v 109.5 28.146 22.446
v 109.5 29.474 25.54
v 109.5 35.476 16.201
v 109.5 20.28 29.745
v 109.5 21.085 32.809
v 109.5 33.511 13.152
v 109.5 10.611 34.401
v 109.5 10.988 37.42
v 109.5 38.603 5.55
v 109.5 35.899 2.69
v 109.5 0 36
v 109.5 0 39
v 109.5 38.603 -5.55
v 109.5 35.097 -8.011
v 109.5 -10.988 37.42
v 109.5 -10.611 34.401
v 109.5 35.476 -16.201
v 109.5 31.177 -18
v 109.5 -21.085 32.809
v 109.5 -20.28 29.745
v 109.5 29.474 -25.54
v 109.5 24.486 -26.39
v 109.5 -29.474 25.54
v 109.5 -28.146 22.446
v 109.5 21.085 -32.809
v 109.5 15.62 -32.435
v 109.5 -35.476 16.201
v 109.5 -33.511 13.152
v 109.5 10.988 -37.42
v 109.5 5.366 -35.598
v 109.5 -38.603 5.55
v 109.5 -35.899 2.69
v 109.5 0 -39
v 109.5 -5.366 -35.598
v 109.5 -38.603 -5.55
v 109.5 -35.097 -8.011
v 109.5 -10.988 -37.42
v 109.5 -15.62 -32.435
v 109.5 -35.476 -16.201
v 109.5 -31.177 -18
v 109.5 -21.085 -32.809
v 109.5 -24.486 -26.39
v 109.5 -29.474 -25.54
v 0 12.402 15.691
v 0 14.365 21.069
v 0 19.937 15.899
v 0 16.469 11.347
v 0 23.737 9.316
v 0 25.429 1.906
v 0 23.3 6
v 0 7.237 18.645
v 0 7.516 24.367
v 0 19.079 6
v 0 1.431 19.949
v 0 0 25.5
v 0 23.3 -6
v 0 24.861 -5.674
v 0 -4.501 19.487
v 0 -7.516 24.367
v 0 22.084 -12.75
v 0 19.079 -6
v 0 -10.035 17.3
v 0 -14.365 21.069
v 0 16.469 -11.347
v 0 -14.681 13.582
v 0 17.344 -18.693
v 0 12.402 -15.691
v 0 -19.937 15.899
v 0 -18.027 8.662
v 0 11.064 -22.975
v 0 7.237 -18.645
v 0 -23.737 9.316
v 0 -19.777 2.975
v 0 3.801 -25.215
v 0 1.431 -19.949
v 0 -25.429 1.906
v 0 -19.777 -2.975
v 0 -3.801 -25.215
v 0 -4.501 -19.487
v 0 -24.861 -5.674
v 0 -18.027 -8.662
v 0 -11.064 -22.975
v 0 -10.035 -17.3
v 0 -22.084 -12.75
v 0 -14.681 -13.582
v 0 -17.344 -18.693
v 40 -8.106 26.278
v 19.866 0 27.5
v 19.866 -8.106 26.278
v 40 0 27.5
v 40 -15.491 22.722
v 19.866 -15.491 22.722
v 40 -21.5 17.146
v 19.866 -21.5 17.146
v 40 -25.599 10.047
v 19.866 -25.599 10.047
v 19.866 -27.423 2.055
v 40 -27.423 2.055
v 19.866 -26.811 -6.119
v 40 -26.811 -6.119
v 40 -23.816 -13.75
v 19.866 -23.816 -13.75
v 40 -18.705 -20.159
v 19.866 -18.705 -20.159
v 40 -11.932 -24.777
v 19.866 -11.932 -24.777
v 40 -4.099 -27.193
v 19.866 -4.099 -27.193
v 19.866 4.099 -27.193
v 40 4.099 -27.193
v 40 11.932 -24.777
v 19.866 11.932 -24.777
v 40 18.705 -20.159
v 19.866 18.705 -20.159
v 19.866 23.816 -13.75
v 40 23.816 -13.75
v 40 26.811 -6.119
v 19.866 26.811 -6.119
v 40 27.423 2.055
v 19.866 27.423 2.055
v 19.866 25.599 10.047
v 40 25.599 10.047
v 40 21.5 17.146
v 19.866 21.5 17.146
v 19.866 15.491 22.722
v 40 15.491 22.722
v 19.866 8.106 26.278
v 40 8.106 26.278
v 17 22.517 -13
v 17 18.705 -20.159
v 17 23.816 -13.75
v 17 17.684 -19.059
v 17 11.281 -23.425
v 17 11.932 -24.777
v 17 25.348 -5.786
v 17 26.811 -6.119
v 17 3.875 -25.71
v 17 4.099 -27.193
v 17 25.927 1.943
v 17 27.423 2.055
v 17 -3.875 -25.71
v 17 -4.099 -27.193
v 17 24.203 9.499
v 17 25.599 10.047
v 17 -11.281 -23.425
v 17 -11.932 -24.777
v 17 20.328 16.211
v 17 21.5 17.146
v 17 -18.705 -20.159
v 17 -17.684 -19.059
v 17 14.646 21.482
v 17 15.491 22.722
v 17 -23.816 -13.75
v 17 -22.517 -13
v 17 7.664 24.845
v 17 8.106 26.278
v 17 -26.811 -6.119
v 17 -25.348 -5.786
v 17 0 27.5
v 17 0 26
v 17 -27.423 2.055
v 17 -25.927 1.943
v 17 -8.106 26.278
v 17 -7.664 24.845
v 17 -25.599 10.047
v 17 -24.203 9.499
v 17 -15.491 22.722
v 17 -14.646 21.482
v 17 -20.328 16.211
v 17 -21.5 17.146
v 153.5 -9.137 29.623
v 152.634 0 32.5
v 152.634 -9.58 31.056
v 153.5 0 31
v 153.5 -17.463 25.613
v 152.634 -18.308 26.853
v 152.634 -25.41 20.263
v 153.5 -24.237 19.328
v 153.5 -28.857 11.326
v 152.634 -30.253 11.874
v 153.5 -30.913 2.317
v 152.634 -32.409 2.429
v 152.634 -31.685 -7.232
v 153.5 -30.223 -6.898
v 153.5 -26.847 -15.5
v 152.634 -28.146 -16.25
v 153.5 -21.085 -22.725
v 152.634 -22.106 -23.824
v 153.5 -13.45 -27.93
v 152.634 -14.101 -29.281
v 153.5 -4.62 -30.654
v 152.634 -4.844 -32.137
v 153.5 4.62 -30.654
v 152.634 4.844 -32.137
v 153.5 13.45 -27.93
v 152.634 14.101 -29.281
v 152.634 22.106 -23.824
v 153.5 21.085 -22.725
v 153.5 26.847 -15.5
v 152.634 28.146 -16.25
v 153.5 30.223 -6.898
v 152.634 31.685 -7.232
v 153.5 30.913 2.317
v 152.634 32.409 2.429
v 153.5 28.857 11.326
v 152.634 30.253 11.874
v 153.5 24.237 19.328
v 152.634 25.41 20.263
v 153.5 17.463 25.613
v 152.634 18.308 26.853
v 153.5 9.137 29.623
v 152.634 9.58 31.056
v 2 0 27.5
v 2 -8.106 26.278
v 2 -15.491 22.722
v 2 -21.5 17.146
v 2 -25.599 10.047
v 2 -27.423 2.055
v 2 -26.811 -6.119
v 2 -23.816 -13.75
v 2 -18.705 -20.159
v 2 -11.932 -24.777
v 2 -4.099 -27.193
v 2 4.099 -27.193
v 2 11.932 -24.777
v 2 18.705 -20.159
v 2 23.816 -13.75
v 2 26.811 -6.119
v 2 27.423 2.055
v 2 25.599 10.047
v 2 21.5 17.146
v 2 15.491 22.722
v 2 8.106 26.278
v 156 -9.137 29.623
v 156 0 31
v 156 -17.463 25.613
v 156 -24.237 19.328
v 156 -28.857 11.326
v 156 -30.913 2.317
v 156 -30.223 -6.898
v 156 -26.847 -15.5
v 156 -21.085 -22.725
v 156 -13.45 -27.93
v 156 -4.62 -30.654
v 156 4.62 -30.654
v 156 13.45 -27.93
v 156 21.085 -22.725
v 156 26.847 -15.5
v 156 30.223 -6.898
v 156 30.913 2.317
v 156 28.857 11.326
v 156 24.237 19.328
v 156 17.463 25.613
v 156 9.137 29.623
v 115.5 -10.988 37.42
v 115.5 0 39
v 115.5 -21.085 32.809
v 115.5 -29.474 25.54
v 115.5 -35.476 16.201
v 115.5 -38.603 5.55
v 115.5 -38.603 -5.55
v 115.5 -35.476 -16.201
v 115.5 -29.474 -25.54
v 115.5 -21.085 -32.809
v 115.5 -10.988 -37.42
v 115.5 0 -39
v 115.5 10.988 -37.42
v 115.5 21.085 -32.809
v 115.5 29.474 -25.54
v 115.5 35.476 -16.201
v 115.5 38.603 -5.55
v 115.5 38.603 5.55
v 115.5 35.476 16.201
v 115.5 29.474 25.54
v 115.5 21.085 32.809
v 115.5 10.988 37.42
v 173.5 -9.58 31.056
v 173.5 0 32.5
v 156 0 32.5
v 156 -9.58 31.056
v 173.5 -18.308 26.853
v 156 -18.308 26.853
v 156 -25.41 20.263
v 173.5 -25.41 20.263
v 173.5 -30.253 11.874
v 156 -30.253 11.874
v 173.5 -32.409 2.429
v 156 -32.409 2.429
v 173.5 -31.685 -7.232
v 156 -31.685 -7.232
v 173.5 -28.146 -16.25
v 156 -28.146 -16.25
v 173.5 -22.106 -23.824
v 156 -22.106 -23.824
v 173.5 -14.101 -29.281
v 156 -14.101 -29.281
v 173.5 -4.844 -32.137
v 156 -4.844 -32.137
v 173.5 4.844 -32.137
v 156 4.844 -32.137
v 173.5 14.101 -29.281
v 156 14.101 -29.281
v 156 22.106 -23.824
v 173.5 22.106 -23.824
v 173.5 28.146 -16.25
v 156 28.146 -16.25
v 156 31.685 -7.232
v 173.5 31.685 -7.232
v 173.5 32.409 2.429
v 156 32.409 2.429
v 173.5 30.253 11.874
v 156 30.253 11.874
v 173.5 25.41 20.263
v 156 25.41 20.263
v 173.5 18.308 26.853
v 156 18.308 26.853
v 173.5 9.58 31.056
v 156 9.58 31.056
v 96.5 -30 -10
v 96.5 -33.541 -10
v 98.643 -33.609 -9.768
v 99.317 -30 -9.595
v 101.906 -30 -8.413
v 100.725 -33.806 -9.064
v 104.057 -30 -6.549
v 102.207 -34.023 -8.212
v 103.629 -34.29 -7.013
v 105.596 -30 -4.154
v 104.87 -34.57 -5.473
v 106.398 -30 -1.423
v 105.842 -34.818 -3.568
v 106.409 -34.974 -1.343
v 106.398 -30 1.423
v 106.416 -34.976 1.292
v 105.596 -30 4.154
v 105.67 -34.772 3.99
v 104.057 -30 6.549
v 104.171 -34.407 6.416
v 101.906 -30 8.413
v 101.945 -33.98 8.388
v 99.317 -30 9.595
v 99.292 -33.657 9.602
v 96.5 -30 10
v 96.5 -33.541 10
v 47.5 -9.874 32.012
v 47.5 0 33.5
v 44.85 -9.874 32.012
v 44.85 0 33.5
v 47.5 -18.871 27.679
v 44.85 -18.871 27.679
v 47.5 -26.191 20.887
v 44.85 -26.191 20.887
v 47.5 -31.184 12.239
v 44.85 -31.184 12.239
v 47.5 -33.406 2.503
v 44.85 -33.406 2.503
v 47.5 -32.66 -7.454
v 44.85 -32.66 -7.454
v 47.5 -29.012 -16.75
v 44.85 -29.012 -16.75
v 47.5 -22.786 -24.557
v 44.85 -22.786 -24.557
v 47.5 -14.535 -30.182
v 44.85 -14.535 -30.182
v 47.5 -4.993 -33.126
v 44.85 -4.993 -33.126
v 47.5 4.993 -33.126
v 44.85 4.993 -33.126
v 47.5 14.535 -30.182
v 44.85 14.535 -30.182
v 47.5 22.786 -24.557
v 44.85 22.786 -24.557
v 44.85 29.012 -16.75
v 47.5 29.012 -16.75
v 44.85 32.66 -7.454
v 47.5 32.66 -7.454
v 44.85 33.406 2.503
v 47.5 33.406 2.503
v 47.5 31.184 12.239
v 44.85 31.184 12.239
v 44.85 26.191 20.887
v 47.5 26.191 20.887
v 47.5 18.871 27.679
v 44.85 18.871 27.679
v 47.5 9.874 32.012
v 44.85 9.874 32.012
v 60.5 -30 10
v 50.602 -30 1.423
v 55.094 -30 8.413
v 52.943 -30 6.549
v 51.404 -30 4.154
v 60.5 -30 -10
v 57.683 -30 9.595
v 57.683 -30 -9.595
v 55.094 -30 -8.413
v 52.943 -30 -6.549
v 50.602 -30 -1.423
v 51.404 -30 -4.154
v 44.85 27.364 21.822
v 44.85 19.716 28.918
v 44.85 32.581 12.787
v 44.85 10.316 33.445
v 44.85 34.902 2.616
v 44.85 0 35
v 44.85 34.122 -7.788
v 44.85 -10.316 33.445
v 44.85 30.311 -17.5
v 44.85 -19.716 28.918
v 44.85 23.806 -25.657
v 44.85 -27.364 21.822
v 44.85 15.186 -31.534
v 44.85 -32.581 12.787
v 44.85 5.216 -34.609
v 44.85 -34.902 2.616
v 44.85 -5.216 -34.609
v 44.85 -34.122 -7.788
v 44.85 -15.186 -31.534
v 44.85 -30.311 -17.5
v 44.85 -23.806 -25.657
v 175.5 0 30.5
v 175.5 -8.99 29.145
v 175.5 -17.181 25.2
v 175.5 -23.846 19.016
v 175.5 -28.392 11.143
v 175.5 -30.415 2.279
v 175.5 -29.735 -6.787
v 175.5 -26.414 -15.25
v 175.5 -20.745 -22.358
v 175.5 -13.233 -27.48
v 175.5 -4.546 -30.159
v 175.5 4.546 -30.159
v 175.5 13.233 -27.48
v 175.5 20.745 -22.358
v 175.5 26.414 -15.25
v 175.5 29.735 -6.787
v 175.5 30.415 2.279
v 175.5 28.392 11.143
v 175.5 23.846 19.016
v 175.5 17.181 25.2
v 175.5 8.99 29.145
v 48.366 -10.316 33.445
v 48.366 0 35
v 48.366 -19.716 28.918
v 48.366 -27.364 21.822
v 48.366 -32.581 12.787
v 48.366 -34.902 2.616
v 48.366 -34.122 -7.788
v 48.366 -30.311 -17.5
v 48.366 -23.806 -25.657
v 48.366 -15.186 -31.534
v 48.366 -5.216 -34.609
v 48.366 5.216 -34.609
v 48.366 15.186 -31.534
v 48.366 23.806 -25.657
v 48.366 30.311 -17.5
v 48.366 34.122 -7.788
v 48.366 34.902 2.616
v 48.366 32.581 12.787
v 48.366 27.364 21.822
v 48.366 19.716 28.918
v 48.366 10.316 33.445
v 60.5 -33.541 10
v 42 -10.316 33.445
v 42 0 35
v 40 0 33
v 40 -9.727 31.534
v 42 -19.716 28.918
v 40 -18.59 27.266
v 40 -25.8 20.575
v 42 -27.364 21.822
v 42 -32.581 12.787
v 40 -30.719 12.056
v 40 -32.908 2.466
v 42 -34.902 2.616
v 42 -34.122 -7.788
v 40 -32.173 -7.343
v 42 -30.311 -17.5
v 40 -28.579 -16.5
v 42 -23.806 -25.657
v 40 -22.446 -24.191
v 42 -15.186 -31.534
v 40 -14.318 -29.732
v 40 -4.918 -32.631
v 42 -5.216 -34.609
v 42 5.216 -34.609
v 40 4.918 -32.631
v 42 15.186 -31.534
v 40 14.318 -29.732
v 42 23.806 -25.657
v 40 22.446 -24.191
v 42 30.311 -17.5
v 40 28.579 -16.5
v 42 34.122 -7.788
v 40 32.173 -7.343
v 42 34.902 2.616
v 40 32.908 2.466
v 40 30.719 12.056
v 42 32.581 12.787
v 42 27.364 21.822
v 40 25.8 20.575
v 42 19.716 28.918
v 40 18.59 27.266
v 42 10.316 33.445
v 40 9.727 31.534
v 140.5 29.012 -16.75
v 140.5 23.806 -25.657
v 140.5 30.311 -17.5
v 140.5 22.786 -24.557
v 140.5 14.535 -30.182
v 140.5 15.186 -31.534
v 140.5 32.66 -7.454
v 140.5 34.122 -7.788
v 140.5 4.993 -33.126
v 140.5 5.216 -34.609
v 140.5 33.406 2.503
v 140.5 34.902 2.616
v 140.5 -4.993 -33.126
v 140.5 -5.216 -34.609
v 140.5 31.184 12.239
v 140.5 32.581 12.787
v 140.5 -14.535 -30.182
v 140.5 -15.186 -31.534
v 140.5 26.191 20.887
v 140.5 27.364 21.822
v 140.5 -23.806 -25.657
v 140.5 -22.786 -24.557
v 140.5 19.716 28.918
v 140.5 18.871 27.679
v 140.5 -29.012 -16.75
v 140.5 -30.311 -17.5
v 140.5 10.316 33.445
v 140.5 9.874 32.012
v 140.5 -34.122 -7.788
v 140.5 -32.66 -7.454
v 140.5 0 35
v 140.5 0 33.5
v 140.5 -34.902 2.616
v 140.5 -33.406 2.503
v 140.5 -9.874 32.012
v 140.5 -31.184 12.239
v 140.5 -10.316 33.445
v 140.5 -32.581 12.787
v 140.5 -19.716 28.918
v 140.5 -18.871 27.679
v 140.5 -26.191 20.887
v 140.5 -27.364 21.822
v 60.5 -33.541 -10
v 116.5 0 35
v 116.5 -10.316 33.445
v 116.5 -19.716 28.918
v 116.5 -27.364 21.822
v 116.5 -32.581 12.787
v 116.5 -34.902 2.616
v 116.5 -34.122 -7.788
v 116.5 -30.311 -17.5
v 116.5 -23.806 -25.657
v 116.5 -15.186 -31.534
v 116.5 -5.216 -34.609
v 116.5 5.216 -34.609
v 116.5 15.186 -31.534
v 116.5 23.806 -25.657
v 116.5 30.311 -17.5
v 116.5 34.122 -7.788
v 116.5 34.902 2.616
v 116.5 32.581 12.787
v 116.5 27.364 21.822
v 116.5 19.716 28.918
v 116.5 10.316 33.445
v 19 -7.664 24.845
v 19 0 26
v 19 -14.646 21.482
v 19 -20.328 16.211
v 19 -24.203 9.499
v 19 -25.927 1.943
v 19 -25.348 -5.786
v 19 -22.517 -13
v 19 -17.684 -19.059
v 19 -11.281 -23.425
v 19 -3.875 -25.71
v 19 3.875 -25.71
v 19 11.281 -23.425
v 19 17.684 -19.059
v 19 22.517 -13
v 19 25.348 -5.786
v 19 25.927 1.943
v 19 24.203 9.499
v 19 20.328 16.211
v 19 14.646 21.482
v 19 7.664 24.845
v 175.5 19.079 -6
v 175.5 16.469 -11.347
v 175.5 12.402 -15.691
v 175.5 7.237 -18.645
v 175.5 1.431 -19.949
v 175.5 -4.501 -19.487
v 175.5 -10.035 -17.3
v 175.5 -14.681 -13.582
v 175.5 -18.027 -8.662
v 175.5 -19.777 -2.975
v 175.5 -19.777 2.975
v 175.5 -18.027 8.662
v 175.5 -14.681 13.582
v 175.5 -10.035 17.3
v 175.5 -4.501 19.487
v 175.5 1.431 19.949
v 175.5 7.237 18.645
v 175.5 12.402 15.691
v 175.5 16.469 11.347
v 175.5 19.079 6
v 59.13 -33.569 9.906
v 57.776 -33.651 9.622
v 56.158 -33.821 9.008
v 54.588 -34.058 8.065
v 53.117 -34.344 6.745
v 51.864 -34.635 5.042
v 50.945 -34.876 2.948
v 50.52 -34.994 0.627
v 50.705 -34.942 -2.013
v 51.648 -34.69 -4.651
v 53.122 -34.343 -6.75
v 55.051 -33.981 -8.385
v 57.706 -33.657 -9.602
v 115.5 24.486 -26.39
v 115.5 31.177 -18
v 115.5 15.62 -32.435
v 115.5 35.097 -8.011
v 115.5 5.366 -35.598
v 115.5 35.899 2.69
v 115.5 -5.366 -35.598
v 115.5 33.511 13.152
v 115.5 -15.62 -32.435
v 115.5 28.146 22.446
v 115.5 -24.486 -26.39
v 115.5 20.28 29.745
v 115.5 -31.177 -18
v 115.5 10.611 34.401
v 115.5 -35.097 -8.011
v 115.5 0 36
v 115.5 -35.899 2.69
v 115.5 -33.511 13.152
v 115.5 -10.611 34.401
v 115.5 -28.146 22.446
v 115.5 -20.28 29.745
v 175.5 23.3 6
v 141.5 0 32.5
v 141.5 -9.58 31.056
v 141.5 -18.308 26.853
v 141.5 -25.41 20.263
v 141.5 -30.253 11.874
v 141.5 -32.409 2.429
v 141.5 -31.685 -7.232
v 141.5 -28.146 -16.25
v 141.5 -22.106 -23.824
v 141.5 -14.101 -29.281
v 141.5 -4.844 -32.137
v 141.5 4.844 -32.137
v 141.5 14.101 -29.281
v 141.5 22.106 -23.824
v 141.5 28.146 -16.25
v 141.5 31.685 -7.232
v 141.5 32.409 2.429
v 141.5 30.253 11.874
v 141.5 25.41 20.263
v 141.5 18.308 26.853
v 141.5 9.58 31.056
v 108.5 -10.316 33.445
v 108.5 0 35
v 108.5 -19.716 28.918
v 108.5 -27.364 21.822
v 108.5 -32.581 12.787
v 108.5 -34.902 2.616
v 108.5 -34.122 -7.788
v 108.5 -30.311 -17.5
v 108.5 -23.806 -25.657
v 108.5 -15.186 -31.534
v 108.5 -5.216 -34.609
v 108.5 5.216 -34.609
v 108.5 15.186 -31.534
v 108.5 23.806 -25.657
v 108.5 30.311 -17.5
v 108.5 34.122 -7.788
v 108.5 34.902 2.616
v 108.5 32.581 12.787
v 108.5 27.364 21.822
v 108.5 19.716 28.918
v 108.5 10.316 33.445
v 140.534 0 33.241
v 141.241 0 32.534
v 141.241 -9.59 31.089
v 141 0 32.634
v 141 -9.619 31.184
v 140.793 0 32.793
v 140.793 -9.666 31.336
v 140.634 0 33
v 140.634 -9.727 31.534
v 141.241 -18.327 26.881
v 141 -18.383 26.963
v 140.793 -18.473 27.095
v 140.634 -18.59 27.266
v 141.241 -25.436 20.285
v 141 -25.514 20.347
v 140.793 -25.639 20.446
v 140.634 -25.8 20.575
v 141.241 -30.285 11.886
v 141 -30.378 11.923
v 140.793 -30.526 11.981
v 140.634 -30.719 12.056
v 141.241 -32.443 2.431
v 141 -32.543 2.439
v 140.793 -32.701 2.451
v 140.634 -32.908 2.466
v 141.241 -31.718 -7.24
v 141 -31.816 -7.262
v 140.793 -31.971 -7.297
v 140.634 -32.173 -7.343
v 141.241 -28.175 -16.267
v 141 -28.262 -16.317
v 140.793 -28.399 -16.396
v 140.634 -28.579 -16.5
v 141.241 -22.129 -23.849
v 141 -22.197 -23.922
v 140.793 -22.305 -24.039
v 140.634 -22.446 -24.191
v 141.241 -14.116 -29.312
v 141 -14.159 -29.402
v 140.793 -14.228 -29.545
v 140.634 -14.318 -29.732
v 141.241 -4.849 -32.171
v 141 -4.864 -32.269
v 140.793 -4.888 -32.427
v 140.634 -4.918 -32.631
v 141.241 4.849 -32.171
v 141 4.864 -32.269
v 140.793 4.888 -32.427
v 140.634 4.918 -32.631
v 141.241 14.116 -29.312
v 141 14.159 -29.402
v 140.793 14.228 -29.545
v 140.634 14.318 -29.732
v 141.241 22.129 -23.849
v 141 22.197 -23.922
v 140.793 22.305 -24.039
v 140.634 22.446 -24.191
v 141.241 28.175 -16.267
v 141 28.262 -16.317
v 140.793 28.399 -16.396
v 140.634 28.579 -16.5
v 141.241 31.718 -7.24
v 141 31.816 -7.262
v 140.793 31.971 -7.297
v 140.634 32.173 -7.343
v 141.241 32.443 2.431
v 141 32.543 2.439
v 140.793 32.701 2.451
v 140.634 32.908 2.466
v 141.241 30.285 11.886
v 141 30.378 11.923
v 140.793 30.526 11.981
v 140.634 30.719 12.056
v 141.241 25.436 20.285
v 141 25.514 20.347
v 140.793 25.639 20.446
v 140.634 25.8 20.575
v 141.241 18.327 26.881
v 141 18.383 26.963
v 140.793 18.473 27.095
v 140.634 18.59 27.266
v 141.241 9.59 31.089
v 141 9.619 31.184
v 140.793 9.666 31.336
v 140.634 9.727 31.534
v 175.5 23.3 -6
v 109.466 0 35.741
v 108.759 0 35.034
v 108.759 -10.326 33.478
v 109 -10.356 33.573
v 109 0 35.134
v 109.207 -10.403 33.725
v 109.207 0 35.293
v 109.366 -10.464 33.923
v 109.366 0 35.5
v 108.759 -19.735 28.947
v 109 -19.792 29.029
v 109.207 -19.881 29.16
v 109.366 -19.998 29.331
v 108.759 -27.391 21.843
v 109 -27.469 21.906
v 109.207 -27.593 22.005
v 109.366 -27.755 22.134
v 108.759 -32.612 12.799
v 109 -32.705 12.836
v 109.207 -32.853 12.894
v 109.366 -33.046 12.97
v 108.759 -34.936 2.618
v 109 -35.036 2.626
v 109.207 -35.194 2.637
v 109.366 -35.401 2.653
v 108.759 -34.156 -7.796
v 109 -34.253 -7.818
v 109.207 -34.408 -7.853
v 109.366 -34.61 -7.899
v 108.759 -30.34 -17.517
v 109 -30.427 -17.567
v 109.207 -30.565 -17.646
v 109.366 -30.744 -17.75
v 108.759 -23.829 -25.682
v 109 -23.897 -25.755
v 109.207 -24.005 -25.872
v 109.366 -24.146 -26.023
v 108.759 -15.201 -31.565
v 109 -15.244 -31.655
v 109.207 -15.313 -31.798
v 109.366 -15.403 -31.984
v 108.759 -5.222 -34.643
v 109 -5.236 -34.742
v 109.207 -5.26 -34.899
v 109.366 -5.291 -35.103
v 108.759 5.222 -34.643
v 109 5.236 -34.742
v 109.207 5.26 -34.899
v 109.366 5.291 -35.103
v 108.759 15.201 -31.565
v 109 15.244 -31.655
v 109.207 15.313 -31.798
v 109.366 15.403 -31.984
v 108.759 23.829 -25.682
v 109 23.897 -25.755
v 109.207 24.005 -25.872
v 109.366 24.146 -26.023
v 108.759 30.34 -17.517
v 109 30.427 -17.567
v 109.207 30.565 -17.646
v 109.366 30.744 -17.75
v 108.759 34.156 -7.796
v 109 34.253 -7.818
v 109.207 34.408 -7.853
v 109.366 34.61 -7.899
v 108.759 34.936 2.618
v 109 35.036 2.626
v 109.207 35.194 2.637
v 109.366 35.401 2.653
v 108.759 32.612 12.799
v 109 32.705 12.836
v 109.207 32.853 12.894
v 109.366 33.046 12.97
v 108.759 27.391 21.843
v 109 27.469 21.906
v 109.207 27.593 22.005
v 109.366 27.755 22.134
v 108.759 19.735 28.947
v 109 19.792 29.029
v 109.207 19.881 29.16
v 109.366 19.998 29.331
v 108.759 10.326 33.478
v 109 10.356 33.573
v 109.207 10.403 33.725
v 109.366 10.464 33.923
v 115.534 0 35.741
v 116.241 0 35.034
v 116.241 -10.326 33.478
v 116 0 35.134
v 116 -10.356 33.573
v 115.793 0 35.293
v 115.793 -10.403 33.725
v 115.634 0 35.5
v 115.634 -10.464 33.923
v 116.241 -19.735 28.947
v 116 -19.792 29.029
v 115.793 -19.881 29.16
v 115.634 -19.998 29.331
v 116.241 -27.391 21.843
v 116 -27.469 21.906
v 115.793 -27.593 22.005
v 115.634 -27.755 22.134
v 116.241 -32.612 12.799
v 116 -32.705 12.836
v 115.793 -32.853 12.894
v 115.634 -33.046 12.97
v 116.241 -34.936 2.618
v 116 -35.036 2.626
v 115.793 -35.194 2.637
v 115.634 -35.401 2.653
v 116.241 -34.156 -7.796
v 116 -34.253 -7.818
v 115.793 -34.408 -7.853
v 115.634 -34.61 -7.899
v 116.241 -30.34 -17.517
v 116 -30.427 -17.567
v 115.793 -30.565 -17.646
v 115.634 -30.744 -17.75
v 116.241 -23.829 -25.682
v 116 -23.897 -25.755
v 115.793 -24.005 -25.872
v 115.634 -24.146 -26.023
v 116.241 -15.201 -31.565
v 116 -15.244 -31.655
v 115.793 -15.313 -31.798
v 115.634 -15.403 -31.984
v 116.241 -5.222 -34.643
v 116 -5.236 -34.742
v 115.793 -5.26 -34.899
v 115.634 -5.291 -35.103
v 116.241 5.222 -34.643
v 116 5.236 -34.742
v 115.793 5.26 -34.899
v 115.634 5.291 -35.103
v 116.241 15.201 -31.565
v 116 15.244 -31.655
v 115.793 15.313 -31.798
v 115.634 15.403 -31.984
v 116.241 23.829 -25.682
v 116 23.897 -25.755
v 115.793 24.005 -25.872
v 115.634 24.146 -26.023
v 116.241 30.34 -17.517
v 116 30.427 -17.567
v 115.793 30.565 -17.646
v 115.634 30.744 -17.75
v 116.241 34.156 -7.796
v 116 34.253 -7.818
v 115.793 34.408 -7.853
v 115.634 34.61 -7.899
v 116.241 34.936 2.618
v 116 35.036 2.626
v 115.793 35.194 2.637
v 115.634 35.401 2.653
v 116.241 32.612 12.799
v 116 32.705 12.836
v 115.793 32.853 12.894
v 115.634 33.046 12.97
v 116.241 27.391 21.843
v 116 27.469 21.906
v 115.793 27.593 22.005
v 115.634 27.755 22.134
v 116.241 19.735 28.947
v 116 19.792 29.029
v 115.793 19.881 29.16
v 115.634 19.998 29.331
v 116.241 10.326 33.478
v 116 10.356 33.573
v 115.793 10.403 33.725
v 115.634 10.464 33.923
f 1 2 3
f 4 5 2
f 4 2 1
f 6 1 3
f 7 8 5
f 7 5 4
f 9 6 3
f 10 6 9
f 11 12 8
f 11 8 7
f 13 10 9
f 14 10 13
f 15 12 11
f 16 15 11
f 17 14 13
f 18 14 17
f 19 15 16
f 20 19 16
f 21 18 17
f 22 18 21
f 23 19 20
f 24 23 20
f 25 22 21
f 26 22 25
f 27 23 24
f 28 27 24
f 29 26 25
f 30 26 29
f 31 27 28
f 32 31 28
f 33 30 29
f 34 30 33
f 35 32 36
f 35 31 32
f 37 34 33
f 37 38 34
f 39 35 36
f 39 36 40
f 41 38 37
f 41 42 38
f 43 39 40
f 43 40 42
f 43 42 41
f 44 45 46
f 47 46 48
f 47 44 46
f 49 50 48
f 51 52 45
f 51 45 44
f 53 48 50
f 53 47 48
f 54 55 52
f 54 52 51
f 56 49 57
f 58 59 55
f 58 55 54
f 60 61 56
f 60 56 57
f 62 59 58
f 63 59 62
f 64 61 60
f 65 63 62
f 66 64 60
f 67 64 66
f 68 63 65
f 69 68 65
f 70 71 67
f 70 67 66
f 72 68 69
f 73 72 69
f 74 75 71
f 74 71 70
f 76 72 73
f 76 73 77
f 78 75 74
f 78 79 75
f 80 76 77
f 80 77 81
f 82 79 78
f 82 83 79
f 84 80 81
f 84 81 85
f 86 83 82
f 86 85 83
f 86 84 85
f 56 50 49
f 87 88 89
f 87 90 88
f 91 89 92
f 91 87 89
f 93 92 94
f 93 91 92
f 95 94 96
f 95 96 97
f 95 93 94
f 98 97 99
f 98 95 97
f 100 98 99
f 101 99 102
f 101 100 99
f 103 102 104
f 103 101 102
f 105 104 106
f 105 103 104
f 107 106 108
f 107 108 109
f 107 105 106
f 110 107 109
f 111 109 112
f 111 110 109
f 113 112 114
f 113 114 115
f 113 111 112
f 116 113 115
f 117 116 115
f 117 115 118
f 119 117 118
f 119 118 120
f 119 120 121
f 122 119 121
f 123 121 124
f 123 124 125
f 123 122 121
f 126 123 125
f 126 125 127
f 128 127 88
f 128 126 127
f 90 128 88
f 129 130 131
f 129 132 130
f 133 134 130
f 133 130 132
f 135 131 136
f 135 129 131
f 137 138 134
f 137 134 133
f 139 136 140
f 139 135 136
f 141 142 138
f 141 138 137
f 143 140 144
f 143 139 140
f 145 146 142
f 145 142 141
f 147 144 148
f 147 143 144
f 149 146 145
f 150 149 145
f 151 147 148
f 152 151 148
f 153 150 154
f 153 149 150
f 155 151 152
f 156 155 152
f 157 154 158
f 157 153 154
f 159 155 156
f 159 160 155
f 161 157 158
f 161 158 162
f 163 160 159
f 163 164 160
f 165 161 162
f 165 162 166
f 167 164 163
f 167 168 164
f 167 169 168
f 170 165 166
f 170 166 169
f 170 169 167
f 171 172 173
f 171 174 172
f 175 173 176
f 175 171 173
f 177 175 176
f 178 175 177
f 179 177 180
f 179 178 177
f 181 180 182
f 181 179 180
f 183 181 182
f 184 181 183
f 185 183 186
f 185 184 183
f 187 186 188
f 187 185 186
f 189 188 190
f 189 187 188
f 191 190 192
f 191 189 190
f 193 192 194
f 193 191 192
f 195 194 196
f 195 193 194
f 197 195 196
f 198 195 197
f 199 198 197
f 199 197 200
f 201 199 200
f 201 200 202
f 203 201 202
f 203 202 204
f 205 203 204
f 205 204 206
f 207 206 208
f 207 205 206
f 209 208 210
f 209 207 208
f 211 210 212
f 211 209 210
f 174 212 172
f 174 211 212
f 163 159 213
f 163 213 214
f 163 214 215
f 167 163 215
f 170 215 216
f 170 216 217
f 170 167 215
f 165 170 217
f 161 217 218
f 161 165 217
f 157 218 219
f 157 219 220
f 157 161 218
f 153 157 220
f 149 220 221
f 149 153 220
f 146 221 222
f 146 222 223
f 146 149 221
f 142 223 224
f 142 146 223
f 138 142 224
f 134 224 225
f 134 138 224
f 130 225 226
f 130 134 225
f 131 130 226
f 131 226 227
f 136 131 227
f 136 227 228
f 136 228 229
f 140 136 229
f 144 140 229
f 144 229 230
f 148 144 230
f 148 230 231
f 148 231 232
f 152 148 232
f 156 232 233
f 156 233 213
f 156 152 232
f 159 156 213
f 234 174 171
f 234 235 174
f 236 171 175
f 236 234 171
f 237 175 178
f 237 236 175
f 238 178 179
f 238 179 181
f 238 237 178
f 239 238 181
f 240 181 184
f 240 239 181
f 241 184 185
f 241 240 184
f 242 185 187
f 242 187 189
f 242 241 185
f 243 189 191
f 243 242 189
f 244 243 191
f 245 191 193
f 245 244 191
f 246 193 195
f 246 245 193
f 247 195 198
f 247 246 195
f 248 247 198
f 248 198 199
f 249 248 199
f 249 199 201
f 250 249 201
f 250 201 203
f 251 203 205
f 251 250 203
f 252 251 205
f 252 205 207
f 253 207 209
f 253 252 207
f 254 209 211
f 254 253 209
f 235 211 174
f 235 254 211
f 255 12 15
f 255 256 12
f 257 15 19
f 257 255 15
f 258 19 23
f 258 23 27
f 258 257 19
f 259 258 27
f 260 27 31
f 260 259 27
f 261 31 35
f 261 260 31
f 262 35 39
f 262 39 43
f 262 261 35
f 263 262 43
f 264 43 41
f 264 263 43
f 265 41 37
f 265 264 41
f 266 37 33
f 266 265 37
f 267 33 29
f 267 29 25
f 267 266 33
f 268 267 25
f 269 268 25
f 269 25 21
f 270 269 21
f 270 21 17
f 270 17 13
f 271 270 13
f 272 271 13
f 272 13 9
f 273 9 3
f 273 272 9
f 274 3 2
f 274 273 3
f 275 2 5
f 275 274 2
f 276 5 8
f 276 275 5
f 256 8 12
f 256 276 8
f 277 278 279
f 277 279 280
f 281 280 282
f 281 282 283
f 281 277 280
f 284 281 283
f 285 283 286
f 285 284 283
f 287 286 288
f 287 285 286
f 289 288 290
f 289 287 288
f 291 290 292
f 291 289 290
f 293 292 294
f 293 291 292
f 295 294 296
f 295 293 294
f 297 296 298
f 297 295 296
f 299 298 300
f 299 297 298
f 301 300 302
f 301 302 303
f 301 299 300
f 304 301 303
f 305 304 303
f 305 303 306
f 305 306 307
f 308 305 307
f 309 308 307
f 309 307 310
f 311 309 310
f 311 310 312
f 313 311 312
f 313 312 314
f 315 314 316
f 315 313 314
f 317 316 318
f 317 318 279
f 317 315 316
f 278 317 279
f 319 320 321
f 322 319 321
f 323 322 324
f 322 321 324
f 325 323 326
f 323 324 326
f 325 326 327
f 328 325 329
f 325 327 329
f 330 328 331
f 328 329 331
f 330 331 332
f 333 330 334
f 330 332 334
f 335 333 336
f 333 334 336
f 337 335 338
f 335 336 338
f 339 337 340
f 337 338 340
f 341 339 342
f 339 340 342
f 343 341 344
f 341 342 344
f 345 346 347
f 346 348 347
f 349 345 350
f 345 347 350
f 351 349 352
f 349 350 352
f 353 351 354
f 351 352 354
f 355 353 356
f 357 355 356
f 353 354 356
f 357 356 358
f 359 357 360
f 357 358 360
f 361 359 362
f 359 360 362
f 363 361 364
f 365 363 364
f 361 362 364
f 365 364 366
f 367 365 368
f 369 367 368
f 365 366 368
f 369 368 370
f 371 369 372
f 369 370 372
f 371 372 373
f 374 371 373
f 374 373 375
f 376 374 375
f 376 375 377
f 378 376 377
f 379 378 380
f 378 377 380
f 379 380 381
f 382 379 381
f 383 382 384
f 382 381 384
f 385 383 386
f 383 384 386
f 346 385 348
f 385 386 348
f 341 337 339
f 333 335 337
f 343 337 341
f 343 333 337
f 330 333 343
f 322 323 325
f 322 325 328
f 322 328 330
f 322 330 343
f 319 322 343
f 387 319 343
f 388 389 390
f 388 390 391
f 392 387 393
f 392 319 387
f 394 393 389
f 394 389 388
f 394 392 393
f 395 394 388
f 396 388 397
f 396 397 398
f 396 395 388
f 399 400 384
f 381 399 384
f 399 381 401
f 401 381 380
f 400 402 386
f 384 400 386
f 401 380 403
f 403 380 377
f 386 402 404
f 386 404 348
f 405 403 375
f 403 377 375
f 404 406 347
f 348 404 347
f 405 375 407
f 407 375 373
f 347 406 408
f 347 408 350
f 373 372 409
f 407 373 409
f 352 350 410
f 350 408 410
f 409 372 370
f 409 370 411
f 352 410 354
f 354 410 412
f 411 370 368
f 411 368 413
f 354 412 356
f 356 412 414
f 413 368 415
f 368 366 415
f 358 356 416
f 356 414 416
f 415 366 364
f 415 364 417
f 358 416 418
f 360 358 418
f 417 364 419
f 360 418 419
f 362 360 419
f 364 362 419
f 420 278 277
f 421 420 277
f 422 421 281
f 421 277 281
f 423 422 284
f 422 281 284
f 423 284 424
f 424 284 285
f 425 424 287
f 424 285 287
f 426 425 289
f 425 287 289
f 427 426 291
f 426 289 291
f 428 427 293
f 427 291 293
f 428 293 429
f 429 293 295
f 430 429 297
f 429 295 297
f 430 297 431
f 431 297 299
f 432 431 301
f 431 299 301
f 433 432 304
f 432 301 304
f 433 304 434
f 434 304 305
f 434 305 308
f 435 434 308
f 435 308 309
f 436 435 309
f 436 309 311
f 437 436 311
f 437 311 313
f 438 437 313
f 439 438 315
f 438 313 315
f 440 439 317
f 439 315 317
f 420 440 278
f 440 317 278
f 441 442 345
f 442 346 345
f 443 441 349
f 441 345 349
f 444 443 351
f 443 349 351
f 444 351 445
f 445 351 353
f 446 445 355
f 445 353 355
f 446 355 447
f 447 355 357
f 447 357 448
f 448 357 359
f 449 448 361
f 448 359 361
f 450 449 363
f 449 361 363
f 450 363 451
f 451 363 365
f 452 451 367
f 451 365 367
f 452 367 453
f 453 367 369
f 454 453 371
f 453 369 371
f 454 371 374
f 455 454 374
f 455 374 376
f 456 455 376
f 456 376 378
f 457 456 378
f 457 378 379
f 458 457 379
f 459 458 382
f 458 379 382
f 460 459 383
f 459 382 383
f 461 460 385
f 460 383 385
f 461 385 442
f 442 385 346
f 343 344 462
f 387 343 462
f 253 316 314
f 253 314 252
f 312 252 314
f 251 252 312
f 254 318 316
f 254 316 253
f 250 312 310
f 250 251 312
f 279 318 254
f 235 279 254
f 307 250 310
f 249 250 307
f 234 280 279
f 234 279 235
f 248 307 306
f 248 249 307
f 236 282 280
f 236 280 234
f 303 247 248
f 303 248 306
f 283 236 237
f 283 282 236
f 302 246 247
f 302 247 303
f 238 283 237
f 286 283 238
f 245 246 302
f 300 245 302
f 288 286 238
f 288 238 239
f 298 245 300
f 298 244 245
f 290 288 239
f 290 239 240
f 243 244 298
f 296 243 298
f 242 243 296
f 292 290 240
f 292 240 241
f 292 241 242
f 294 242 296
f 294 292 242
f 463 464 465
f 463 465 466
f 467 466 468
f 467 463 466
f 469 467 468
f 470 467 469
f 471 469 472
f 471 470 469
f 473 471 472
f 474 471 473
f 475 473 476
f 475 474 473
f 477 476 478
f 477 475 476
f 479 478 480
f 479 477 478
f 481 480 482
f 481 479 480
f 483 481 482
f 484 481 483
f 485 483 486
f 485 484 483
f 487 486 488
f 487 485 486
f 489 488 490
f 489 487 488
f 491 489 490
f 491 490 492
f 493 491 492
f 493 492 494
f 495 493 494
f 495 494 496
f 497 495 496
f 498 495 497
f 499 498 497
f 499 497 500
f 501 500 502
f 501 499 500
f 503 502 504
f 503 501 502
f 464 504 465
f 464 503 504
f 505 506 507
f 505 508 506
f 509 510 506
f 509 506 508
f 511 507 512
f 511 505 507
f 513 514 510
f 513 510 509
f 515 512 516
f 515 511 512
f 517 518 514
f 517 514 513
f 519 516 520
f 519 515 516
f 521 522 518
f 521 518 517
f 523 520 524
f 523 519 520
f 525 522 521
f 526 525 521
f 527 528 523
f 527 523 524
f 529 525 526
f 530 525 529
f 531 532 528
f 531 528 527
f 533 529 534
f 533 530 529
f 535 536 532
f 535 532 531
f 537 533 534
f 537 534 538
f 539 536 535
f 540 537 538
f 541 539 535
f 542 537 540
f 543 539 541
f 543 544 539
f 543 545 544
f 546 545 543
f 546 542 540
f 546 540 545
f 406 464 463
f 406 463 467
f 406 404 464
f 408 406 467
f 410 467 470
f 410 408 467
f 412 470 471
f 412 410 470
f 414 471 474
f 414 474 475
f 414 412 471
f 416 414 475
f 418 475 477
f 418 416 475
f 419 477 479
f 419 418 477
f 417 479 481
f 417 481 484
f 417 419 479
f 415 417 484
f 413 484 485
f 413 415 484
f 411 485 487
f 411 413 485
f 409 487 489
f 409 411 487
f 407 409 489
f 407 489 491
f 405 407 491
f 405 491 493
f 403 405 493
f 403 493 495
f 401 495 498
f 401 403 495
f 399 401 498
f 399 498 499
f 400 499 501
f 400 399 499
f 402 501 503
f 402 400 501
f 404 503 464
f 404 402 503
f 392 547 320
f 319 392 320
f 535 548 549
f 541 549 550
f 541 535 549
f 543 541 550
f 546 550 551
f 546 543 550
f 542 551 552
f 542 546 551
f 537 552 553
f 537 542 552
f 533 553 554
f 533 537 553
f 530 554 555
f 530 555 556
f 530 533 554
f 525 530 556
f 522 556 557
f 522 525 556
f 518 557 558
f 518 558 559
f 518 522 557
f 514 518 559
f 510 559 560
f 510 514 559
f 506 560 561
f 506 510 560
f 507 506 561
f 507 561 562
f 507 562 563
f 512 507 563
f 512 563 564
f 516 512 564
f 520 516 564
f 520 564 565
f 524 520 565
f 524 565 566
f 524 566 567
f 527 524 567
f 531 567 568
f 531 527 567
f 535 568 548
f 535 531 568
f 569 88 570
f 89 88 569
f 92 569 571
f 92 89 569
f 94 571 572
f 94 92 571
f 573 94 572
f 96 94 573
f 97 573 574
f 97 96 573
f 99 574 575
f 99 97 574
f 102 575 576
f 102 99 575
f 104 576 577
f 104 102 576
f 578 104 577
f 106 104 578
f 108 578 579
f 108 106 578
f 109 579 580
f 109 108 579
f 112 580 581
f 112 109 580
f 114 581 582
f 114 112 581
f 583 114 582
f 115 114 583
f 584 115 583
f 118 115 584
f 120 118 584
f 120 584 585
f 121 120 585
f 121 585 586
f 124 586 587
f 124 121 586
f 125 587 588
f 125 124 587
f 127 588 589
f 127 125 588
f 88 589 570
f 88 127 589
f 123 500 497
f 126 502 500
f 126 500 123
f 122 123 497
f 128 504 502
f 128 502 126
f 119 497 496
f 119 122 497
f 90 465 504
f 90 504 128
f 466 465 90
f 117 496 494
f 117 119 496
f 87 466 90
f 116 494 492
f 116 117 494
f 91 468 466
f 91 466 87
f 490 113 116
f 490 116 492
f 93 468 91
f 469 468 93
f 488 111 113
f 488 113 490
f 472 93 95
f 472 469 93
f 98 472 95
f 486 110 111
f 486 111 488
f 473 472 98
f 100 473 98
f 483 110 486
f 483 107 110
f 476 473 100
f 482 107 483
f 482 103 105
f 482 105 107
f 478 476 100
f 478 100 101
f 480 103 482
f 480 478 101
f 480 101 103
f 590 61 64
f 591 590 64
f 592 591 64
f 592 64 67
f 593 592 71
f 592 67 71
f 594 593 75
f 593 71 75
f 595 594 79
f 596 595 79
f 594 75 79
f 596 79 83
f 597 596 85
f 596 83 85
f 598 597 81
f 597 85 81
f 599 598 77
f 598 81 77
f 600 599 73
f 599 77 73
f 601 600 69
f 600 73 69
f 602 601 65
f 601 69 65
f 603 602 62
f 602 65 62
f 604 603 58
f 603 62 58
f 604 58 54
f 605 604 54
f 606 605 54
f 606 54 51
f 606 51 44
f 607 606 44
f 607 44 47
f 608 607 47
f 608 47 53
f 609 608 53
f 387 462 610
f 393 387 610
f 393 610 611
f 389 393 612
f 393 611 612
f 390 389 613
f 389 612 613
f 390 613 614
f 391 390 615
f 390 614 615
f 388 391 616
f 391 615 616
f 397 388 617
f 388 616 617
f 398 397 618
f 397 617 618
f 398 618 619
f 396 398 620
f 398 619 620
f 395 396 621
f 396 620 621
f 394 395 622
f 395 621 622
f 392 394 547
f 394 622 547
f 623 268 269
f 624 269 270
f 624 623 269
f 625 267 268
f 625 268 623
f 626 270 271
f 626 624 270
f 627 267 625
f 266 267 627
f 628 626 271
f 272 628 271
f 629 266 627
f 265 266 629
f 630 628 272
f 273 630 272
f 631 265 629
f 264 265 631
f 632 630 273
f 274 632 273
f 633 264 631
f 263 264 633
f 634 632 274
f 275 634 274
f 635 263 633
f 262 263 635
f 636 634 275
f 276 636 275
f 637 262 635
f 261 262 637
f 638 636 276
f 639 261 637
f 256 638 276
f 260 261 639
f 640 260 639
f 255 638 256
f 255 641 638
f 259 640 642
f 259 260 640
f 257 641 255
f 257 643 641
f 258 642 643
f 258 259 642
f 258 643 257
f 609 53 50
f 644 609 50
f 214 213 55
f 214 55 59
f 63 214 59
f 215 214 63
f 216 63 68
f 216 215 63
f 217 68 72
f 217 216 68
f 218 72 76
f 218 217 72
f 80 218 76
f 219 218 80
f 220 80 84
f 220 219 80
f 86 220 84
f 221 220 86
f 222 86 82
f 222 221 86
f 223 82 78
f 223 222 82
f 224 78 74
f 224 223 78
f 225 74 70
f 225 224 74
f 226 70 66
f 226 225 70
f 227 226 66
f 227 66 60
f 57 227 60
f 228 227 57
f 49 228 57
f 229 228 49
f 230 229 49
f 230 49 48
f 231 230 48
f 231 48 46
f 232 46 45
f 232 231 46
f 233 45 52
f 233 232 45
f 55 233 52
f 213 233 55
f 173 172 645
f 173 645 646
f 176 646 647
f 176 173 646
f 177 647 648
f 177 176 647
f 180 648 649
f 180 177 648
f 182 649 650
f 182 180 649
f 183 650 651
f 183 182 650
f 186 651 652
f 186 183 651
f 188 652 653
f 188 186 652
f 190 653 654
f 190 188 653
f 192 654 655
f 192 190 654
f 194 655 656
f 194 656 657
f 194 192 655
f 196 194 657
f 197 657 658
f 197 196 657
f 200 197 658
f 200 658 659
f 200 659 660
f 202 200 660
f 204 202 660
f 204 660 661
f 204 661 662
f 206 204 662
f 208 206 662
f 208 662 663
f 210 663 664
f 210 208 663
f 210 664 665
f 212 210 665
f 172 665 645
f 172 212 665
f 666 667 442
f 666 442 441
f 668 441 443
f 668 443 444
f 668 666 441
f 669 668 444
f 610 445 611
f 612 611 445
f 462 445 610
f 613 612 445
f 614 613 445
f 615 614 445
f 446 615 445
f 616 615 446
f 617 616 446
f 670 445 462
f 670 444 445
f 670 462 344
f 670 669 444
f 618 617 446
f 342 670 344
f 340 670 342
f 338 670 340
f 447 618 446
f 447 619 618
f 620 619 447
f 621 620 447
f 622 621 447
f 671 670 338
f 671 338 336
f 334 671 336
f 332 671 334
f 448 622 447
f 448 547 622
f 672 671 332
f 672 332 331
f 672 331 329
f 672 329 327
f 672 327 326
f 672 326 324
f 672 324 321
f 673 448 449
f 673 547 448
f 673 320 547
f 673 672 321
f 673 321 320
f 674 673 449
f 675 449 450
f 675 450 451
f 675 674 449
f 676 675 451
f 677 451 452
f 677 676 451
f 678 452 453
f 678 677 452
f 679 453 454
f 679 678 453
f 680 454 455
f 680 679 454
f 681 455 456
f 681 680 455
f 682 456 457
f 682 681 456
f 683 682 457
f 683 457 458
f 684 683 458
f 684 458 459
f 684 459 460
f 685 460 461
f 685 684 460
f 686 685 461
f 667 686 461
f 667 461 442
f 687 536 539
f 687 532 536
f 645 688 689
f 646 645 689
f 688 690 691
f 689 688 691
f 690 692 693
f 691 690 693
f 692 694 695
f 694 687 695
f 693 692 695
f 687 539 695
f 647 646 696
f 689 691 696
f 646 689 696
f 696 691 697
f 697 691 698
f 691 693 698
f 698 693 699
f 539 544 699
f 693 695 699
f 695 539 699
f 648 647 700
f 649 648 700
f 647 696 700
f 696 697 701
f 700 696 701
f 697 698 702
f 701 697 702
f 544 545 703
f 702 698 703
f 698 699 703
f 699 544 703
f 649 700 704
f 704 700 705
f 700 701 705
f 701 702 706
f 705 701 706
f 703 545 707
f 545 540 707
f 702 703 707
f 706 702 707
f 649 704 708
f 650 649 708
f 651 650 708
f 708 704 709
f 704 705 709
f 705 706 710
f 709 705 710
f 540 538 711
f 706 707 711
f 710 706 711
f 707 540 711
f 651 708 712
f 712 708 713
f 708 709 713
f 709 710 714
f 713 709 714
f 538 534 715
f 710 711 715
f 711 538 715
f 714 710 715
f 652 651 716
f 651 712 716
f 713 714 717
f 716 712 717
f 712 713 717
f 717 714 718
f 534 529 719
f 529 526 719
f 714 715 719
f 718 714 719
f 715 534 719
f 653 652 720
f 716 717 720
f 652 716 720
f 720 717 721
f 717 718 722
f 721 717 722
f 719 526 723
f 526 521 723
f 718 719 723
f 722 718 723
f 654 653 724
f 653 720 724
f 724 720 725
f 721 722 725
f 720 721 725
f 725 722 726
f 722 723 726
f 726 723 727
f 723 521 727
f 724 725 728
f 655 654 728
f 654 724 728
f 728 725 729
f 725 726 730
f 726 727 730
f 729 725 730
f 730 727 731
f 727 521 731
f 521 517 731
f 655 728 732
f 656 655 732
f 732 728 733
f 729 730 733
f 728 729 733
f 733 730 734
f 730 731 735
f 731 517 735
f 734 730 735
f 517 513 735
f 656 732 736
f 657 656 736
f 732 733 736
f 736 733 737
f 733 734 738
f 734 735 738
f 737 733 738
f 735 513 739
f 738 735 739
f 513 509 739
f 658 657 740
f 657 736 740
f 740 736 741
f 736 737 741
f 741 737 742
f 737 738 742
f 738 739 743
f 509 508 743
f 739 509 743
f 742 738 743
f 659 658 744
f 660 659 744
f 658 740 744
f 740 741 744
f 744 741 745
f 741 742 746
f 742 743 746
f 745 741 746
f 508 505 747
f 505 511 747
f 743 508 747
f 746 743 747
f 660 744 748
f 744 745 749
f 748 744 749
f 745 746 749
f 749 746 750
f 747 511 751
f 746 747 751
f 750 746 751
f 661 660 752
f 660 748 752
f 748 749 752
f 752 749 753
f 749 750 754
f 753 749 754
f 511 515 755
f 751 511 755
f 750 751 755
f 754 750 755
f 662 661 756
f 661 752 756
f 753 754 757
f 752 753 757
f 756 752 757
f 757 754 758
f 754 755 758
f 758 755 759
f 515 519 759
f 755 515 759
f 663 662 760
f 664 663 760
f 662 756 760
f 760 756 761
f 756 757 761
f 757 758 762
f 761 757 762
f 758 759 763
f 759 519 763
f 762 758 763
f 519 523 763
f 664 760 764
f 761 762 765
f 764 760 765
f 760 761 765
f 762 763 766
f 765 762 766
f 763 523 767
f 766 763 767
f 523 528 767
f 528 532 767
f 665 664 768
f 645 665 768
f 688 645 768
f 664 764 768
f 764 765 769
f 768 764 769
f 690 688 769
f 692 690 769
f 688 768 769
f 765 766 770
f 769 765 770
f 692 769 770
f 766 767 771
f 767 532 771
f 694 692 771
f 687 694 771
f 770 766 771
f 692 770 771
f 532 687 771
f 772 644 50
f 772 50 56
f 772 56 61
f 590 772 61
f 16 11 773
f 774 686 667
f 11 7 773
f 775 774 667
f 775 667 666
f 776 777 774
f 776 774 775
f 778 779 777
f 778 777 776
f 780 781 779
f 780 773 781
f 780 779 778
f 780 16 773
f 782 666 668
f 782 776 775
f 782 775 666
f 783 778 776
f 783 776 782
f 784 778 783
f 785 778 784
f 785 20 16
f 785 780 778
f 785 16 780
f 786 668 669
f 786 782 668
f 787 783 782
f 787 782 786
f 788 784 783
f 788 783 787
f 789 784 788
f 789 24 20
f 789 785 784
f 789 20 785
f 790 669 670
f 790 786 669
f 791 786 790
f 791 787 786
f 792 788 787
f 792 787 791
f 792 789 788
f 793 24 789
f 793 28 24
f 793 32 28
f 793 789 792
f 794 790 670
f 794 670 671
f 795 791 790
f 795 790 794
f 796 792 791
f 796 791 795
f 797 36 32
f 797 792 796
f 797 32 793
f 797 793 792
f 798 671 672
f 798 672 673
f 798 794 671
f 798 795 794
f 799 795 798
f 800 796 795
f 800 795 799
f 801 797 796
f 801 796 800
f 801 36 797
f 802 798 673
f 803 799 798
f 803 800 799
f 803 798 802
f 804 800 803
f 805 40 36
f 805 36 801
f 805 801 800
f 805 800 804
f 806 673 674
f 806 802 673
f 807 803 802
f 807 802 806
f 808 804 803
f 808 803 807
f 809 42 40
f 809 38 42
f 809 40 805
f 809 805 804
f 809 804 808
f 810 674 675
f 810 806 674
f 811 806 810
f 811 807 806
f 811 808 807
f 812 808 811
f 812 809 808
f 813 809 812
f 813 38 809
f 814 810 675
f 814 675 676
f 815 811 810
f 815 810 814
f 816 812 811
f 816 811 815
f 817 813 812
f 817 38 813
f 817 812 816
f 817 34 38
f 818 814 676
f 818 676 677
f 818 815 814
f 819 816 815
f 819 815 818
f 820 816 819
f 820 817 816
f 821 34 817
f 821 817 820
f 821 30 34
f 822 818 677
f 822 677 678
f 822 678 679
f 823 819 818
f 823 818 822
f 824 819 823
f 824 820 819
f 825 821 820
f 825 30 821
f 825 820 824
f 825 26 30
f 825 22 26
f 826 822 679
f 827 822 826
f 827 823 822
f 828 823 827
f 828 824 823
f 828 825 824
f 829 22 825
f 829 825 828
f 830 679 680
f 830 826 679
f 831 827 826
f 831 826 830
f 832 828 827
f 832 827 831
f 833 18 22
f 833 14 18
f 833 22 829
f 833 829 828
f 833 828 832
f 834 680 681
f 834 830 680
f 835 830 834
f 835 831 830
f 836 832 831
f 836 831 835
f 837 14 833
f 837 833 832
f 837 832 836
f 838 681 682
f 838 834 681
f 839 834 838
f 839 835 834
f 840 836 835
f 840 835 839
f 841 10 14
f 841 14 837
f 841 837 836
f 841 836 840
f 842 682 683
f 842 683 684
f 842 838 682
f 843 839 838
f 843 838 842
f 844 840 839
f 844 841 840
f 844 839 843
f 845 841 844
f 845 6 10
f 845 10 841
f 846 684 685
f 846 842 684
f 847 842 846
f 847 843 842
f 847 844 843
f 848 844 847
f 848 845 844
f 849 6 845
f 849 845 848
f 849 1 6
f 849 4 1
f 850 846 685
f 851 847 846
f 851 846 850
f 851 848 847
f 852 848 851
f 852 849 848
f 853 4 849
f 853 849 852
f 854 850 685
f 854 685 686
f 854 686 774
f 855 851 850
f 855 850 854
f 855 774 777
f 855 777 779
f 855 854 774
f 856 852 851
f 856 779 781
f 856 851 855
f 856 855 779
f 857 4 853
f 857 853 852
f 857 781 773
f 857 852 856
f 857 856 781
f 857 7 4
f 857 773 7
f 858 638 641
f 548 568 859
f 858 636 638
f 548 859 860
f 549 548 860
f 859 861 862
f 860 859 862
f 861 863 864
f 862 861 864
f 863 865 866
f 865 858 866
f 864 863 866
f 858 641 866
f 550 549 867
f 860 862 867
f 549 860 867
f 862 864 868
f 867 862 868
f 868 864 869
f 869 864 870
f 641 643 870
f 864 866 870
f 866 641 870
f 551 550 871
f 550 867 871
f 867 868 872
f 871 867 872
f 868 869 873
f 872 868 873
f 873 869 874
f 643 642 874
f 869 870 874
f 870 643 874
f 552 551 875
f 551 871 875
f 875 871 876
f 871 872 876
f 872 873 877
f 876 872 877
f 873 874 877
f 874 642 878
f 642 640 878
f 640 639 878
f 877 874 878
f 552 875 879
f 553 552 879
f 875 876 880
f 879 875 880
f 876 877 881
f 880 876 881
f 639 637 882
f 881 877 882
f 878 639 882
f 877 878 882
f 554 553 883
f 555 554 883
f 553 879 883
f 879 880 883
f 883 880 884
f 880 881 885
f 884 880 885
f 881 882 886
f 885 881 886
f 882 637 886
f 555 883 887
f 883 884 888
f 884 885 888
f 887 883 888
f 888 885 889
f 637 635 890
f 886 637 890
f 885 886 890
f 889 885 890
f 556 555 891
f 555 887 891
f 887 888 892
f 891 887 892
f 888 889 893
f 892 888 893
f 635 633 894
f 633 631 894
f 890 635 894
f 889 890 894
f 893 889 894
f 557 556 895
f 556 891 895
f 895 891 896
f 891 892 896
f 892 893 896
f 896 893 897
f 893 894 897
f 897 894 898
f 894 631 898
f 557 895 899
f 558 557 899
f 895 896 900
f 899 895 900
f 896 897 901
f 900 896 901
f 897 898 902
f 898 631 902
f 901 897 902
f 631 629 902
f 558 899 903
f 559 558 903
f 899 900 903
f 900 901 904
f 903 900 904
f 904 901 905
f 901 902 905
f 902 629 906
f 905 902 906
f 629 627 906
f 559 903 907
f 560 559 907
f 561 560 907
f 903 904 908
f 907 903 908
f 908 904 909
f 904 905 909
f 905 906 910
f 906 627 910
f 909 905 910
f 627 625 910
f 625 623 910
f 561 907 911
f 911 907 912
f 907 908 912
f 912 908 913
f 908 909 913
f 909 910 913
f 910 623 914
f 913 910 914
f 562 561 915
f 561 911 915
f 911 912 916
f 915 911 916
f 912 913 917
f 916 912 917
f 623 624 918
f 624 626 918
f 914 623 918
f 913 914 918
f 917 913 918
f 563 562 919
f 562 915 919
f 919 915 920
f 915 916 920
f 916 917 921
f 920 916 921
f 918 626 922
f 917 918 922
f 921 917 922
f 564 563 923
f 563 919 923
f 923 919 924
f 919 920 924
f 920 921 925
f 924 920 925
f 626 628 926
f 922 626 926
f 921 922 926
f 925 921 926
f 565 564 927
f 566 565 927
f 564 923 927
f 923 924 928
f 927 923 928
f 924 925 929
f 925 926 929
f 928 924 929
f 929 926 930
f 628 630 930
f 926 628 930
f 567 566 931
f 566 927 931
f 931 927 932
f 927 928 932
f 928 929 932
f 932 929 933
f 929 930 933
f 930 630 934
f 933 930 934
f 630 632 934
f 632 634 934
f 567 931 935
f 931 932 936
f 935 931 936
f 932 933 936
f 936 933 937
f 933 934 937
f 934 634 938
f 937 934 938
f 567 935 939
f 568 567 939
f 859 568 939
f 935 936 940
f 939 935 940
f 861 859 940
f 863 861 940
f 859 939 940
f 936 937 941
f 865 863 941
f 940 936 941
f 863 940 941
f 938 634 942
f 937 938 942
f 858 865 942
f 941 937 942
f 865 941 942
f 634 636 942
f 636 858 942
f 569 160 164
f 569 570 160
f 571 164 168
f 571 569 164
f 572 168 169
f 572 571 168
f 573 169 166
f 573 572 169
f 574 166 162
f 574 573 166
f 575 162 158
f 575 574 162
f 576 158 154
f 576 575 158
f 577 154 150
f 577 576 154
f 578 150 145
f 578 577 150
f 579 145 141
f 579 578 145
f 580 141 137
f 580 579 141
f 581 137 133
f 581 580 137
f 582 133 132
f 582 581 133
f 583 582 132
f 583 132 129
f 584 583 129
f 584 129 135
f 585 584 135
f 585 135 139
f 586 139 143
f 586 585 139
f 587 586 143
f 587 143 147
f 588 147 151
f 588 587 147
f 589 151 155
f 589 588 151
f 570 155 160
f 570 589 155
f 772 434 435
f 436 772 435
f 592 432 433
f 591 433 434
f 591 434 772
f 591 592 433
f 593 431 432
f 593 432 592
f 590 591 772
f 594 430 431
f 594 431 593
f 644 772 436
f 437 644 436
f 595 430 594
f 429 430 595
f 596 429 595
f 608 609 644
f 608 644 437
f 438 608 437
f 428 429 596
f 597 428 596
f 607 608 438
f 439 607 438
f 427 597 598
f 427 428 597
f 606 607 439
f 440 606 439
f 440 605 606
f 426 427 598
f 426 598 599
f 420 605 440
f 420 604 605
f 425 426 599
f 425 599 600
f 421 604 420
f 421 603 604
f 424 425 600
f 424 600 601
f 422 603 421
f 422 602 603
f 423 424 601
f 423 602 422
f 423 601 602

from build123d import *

# Parameters (mm, degrees)
SCHIZZO2_R               = 20
TAGLIO_ESTRUSIONE1_DEPTH = 184.962632075
SMUSSO1_SIZE             = 2
RACCORDO1_R              = 1
TAGLIO_ESTRUSIONE2_START = -35
TAGLIO_ESTRUSIONE2_DEPTH = 5


with BuildPart() as part:
    # Schizzo1 → Rivoluzione1 (revolve)
    with BuildSketch(Plane.XY, mode=Mode.PRIVATE) as rivoluzione1_sk:
        Polygon((0, 0), (0, 27.5), (17, 27.5), (17, 26), (19, 26), (19.866025404, 27.5), (40, 27.5), (40, 35), (109.5, 35), (109.5, 39), (115.5, 39), (115.5, 35), (140.5, 35), (140.5, 32.5), (152.633974596, 32.5), (153.5, 31), (156, 31), (156, 32.5), (175.5, 32.5), (175.5, 0), align=None)
    revolve(rivoluzione1_sk.sketch.rotate(Axis((0, 0, 0), (1, 0, 0)), 90), axis=Axis((0, 0, 0), (1, 0, 0)))

    # Schizzo2 → Taglio-Estrusione1 (cut, through all)
    with BuildSketch(Plane.ZY):
        with BuildLine():
            ThreePointArc((-6, 19.078784028), (-3.035153986, 19.768354516), (0, 20))
            Line((0, 20), (0, 23.3))
            Line((0, 23.3), (-6, 23.3))
            Line((-6, 23.3), (-6, 19.078784028))
        make_face()
        with BuildLine():
            Line((0, 23.3), (0, 20))
            ThreePointArc((0, 20), (3.035153986, 19.768354516), (6, 19.078784028))
            Line((6, 19.078784028), (6, 23.3))
            Line((6, 23.3), (0, 23.3))
        make_face()
        Circle(SCHIZZO2_R)
    extrude(amount=-TAGLIO_ESTRUSIONE1_DEPTH, mode=Mode.SUBTRACT)

    # Smusso1
    smusso1_edges = [part.edges().sort_by_distance(p)[0] for p in [
        (175.5, 0, -32.5),
        (40, 0, -35),
        (0, 0, -27.5),
    ]]
    chamfer(smusso1_edges, length=SMUSSO1_SIZE)

    # Raccordo1
    raccordo1_edges = [part.edges().sort_by_distance(p)[0] for p in [
        (140.5, 0, -32.5),
        (115.5, 0, -35),
        (109.5, 0, -35),
    ]]
    fillet(raccordo1_edges, radius=RACCORDO1_R)

    # Schizzo3 → Taglia-Rivoluzione1 (revolve, cut)
    with BuildSketch(Plane.XY, mode=Mode.PRIVATE) as taglia_rivoluzione1_sk:
        Polygon((48.366025404, 35), (47.5, 33.5), (44.85, 33.5), (44.85, 35), align=None)
    revolve(taglia_rivoluzione1_sk.sketch.rotate(Axis((-16.412152114, 0, 0), (1, 0, 0)), 90), axis=Axis((-16.412152114, 0, 0), (1, 0, 0)), mode=Mode.SUBTRACT)

    # Schizzo4 → Taglio-Estrusione2 (cut)
    with BuildSketch(Plane(origin=(0, 0, 0), x_dir=(1, 0, 0), z_dir=(0, 1, 0)).offset(TAGLIO_ESTRUSIONE2_START)):
        with BuildLine():
            Line((60.5, 10), (96.5, 10))
            ThreePointArc((96.5, 10), (106.5, 0), (96.5, -10))
            Line((96.5, -10), (60.5, -10))
            ThreePointArc((60.5, -10), (50.5, 0), (60.5, 10))
        make_face()
    extrude(amount=TAGLIO_ESTRUSIONE2_DEPTH, mode=Mode.SUBTRACT)


solid = part.part
